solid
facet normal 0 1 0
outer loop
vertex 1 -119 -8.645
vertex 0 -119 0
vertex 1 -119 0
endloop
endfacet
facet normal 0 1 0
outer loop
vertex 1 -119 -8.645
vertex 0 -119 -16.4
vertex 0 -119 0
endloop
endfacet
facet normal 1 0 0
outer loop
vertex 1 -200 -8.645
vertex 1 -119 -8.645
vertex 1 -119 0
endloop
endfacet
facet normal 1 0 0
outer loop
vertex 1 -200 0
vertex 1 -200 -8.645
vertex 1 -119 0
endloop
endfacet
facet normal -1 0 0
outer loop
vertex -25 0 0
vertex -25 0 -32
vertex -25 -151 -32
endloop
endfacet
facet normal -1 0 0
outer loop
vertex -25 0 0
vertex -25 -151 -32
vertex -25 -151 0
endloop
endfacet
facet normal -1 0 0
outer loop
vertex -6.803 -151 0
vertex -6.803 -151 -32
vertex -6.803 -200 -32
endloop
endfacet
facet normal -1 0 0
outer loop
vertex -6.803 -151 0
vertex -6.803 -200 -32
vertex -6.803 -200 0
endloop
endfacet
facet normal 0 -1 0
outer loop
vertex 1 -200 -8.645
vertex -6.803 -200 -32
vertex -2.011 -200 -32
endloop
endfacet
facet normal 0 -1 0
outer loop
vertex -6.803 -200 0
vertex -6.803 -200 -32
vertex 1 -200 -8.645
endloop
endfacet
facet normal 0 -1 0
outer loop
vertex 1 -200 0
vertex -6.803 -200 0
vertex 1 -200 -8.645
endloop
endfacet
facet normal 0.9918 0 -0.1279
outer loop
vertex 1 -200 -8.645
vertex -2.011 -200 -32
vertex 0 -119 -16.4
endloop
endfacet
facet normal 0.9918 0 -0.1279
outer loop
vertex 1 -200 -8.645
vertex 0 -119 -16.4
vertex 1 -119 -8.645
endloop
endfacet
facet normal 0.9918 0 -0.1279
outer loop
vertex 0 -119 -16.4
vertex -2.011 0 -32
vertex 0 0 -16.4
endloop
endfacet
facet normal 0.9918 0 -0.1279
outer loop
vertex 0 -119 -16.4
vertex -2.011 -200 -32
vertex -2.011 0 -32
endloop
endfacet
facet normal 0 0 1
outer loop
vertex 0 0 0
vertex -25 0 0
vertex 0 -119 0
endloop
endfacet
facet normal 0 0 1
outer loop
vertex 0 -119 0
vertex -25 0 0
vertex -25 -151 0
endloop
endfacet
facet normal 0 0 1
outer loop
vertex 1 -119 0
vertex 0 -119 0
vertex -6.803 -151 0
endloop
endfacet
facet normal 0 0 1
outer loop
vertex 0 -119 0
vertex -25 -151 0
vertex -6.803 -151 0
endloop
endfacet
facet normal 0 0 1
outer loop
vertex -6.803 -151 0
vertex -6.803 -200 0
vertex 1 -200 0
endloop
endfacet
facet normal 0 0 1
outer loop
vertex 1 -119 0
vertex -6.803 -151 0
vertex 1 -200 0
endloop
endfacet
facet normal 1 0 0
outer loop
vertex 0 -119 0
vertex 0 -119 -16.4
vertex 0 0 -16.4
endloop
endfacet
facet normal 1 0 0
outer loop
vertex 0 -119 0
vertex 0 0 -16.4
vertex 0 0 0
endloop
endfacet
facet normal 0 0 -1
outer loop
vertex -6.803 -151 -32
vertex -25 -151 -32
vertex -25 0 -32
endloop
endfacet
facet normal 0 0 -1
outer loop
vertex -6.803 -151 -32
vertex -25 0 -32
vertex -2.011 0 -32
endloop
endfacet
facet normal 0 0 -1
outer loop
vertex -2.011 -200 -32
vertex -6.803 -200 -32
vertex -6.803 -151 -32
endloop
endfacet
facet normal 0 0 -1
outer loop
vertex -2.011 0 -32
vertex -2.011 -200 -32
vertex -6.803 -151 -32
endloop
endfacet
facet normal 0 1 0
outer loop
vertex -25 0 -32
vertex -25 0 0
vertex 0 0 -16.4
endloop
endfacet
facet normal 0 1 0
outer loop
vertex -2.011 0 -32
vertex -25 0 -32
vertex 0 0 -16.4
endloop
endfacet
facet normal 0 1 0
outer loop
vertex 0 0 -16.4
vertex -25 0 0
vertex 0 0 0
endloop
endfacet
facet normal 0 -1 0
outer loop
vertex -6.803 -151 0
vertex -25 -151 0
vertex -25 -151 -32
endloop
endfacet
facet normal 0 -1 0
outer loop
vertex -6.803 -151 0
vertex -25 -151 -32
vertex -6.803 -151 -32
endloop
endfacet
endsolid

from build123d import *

# Parameters (mm, degrees)
F0_W     = 25
F0_H     = 32
F1_DEPTH = 151
F2_W     = 6.8026450463
F2_H     = 32
F3_DEPTH = 49
F4_W     = 1
F4_H     = 32
F5_DEPTH = 81
F7_DEPTH = 248


with BuildPart() as f1:
    # F0 (on Front) → F1 (new body)
    with BuildSketch(Plane.XZ):
        with Locations((-12.5, -16)):
            Rectangle(F0_W, F0_H)
    extrude(amount=F1_DEPTH)

    # F2 (on face) → F3 (join)
    with BuildSketch(Plane.XZ.offset(151)):
        with Locations((-3.4013225231, -16)):
            Rectangle(F2_W, F2_H)
    extrude(amount=F3_DEPTH)

    # F4 (on face) → F5 (join)
    with BuildSketch(Plane.XZ.offset(200)):
        with Locations((0.5, -16)):
            Rectangle(F4_W, F4_H)
    extrude(amount=-F5_DEPTH)

    # F6 (on face) → F7 (cut)
    with BuildSketch(Plane(origin=(0, 0, 0), x_dir=(-1, 0, 0), z_dir=(0, 1, 0))):
        Polygon((2.8292152565, -38.3428484201), (-1.4198042918, -5.388750229), (-12.2544799853, -38.3428484201), align=None)
    extrude(amount=-F7_DEPTH, mode=Mode.SUBTRACT)


solid = f1.part
